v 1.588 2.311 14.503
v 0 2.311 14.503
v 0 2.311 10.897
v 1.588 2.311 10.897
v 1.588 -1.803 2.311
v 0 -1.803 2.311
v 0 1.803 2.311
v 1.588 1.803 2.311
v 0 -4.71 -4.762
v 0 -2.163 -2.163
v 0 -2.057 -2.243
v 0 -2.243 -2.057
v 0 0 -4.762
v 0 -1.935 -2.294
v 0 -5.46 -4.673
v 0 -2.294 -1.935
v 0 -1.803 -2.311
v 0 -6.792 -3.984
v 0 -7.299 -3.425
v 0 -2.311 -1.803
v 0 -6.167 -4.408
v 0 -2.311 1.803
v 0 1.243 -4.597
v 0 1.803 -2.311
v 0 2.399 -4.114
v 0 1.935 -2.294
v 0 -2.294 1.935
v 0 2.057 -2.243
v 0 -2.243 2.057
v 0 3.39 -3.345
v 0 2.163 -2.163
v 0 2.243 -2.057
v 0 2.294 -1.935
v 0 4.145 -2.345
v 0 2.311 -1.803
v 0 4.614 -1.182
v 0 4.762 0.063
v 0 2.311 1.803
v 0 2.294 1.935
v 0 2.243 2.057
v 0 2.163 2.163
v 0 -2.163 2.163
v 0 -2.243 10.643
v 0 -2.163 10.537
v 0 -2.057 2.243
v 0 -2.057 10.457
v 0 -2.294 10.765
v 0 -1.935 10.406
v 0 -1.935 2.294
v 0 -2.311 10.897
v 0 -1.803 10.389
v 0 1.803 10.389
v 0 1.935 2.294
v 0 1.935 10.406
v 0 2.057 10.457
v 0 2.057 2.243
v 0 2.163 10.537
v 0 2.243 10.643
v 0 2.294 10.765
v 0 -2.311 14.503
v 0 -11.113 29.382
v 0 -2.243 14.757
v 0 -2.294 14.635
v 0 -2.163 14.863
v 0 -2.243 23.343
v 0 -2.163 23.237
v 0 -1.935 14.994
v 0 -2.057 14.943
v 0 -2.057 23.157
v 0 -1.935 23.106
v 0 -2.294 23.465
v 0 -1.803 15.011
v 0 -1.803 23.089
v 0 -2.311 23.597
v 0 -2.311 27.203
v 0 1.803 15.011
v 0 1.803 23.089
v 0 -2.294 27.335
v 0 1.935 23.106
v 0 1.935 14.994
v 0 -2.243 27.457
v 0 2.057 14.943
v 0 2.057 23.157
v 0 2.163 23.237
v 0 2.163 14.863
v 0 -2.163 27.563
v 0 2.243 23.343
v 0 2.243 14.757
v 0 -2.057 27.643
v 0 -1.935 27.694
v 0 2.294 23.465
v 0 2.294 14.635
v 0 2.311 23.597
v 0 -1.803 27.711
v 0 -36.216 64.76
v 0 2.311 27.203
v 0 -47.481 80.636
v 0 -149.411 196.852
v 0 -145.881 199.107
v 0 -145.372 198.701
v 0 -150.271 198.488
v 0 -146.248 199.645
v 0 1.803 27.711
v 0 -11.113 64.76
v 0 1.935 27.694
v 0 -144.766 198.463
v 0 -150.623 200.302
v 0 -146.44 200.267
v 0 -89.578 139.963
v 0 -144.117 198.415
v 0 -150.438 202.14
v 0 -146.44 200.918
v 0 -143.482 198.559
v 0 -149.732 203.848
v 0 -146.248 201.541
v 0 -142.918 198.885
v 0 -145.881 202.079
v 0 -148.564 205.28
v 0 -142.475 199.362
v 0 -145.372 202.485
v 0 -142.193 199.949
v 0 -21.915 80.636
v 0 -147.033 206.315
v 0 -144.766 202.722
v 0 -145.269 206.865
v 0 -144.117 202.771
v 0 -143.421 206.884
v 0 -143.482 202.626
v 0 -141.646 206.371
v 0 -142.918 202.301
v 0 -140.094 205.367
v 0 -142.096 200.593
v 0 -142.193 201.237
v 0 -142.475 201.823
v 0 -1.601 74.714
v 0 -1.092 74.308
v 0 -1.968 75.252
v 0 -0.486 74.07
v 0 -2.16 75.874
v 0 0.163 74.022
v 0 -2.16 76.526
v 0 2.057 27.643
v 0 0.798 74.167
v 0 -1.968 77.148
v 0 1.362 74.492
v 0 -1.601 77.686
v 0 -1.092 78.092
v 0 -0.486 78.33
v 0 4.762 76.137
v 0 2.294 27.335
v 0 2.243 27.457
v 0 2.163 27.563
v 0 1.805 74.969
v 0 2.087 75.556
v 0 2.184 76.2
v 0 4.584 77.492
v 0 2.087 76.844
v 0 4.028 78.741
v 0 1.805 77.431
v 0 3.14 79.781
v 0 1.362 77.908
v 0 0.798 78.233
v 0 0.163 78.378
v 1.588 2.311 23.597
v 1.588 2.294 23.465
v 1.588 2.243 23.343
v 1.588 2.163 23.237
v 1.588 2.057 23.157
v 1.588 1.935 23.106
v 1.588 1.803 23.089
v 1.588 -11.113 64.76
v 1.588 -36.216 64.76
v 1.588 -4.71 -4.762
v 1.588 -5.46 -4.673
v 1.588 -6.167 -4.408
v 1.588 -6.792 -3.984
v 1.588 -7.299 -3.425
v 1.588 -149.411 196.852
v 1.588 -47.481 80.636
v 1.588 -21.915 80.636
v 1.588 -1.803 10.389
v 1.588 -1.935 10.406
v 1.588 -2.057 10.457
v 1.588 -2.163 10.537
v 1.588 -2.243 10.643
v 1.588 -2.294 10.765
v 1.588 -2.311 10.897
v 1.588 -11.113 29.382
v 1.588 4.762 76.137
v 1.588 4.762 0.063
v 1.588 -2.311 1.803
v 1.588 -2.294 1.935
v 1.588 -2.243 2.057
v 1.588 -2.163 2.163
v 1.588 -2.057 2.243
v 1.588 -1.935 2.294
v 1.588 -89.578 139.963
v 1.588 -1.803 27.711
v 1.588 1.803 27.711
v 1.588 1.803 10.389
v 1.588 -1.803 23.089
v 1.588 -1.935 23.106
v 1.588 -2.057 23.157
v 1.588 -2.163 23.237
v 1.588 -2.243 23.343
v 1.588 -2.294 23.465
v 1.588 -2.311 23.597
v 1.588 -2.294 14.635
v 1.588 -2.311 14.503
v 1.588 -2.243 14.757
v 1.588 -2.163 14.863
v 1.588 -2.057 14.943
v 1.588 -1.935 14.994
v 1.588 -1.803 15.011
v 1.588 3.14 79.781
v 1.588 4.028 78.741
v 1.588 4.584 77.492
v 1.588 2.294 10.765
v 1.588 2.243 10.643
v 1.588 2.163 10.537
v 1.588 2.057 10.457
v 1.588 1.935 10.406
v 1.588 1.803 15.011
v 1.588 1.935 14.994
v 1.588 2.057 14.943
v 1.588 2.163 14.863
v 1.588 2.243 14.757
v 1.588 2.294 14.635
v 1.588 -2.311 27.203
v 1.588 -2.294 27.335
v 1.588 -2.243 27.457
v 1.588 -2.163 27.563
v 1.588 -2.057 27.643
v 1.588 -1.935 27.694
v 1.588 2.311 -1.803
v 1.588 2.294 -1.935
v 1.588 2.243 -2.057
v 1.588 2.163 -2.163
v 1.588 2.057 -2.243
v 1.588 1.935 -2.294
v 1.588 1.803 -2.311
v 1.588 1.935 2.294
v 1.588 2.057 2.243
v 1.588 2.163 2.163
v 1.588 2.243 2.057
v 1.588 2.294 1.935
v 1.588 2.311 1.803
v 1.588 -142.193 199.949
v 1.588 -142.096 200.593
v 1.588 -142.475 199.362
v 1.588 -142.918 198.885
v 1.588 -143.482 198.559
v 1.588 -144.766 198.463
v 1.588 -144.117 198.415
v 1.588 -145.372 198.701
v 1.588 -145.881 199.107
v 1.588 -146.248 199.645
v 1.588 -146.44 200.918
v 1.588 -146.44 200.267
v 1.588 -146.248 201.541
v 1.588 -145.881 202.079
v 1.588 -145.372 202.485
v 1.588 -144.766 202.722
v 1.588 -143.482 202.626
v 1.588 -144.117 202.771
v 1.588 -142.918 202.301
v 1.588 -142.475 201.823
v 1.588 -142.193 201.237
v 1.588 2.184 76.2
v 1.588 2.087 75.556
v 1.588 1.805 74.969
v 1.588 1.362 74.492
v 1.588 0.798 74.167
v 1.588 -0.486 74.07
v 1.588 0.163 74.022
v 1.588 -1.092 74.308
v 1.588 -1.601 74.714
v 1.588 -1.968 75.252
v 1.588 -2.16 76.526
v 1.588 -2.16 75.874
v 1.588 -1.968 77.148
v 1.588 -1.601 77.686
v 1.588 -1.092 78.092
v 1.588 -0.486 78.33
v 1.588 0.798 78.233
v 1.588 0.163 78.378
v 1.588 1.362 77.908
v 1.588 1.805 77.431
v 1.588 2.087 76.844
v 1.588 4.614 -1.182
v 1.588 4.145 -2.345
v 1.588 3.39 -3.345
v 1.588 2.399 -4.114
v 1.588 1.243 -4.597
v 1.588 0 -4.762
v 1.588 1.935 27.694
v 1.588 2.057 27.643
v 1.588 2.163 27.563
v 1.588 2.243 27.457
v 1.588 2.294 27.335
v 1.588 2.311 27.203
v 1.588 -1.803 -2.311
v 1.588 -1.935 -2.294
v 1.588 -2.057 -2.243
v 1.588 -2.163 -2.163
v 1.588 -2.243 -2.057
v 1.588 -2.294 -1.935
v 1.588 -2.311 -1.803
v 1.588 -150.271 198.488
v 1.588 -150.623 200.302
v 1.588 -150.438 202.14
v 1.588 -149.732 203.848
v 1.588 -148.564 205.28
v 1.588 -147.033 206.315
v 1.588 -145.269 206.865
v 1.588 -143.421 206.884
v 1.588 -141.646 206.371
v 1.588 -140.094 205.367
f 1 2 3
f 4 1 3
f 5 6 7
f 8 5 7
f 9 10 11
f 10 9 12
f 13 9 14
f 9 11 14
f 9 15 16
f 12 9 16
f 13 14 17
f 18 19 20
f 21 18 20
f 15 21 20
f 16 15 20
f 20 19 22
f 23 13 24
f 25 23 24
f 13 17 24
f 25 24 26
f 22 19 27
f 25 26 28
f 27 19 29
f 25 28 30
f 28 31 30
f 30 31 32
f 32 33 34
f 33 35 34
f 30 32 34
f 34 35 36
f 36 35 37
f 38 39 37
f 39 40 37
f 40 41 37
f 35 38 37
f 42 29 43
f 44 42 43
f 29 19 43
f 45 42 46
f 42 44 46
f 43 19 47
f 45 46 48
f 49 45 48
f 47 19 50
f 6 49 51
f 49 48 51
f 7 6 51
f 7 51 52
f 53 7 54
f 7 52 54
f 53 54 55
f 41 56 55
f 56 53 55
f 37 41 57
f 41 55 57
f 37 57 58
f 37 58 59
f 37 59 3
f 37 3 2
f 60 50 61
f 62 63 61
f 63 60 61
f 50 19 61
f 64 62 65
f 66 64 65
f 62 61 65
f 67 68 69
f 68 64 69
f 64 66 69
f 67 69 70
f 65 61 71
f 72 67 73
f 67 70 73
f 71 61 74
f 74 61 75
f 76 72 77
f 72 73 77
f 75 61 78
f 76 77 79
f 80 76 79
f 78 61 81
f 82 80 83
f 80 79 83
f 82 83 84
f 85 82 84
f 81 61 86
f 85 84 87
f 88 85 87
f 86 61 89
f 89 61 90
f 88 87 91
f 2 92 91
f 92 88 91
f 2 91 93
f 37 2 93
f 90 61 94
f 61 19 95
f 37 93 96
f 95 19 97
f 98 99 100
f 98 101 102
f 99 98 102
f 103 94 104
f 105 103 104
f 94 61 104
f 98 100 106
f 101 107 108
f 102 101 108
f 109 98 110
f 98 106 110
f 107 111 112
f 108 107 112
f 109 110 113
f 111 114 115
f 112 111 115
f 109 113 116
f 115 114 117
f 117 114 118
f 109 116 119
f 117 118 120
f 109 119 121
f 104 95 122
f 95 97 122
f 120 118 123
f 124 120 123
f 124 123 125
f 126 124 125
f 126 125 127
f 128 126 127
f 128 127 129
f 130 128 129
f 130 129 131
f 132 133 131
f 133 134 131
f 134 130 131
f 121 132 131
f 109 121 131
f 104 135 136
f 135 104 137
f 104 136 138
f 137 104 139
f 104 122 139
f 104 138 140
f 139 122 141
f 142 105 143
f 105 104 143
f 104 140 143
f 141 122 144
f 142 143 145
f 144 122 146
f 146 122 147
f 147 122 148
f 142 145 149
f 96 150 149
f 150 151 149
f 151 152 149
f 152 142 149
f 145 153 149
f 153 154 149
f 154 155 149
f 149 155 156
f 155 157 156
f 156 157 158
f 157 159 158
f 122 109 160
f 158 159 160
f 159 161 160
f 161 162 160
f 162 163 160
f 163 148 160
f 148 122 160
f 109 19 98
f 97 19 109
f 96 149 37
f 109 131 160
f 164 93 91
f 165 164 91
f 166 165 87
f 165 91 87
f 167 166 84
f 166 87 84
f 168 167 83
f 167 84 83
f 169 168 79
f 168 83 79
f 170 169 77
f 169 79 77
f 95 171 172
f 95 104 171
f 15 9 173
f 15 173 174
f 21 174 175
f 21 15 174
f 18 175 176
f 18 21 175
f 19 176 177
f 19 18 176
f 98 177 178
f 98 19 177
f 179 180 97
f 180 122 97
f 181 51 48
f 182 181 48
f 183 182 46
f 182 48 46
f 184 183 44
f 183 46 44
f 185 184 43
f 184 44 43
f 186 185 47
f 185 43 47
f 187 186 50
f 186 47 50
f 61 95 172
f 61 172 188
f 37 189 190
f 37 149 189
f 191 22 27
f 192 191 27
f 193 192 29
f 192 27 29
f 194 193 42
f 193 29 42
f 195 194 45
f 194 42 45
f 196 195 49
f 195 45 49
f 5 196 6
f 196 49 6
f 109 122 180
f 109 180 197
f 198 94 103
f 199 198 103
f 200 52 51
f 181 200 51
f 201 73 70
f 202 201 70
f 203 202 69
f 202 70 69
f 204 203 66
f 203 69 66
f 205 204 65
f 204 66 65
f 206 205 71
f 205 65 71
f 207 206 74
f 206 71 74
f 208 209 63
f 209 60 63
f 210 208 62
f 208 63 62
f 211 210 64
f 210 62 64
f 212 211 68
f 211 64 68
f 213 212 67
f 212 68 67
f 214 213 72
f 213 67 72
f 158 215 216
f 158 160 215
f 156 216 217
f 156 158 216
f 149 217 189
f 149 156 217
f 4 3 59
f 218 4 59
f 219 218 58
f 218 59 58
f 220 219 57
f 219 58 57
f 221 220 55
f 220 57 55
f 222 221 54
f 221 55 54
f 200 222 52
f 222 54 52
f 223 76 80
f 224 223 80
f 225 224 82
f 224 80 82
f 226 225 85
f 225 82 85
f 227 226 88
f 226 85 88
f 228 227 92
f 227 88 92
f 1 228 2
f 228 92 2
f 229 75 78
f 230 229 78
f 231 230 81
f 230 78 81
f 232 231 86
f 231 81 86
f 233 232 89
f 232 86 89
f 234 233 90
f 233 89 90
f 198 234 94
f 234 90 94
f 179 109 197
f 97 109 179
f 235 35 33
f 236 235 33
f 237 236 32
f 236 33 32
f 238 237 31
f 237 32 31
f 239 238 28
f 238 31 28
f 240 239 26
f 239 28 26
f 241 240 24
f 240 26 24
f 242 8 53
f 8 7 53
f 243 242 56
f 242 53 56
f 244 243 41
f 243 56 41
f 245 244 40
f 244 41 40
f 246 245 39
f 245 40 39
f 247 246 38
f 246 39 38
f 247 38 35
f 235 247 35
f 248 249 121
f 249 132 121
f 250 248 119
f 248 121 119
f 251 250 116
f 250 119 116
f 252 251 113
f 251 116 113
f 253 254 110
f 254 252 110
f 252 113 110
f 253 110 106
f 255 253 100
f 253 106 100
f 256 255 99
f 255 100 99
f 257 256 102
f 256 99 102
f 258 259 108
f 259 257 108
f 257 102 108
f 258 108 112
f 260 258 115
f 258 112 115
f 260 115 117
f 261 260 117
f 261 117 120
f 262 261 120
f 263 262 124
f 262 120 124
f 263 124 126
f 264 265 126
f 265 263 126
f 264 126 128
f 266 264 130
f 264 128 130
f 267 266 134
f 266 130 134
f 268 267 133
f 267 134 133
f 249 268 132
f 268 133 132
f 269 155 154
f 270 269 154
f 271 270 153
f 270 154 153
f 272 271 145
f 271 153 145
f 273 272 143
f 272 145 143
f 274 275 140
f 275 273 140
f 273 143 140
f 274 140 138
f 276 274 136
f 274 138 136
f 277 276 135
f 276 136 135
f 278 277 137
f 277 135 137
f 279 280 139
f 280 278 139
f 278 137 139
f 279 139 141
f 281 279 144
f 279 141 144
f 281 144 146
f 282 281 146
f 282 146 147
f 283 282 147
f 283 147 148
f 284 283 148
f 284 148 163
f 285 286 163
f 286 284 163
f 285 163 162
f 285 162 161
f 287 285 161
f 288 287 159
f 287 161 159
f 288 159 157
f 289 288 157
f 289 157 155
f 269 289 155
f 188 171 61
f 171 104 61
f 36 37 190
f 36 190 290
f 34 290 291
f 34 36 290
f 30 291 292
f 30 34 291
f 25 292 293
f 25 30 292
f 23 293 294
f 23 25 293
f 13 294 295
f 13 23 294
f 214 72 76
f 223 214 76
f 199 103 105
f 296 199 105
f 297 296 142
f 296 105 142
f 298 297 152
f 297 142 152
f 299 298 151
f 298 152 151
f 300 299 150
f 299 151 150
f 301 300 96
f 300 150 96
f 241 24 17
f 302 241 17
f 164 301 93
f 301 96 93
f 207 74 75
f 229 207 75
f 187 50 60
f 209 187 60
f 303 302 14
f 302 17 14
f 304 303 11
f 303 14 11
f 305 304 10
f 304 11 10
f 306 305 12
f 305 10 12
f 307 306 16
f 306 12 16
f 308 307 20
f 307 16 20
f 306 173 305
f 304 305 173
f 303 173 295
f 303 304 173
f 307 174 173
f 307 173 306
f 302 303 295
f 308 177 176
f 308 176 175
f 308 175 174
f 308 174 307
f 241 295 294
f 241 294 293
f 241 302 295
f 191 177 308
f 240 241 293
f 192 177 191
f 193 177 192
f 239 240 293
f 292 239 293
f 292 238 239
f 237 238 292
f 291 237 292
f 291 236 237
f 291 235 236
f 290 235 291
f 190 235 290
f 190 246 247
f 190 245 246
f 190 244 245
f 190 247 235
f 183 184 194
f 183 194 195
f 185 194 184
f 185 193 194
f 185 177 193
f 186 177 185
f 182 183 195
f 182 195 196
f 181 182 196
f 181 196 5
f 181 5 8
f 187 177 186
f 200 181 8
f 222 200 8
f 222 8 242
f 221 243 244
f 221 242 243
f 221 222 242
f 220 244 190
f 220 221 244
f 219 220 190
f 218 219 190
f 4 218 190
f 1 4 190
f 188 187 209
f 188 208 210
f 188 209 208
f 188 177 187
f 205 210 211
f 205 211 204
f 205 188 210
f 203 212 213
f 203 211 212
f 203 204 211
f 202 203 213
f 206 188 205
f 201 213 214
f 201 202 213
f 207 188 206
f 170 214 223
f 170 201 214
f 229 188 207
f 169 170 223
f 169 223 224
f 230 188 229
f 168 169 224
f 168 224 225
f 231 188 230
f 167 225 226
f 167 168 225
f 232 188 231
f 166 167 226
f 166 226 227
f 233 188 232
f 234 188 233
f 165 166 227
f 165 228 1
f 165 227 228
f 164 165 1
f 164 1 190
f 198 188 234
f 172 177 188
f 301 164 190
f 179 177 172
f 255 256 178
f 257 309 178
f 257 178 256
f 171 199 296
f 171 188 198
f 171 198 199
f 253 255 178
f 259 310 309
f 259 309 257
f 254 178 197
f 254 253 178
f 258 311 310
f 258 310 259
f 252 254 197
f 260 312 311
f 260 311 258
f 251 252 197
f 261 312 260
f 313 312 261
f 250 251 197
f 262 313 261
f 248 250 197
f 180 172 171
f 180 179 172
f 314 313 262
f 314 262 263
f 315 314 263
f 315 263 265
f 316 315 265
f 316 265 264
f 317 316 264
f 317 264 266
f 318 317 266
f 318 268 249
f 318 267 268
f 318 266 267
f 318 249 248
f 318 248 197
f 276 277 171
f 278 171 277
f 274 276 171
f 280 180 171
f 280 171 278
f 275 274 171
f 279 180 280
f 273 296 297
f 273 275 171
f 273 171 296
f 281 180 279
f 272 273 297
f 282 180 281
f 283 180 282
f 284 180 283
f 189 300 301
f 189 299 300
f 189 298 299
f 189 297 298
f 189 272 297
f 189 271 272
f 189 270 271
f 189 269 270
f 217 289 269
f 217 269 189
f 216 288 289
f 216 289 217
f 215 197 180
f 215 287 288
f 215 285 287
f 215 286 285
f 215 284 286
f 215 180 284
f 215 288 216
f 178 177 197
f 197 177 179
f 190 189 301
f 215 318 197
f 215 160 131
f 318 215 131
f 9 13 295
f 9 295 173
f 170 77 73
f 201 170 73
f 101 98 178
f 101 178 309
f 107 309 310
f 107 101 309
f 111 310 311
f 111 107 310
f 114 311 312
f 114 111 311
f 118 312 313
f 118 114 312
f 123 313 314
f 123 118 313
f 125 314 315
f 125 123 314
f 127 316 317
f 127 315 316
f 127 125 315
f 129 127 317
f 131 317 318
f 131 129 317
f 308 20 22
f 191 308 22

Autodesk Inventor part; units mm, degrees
ref_plane "YZ Plane" through (0, 0, 0) normal (1, 0, 0) x (0, 1, 0)
ref_plane "XZ Plane" through (0, 0, 0) normal (0, 1, 0) x (-1, 0, 0)
ref_plane "XY Plane" through (0, 0, 0) normal (0, 0, 1) x (1, 0, 0)
sketch "main" plane through (0, 0, 0) normal (0, 0, 1) x (1, 0, 0)
  circle A0 centre (2982.9462, -106.4126) radius 2.1844
  circle A1 centre (2838.6663, 17.9802) radius 2.1844
  arc A2 (2982.9462, -187.3751) -> (2987.7082, -182.5494) centre (2982.9462, -182.6126) ccw
  arc A3 (2987.7082, -106.4758) -> (2986.0859, -102.8316) centre (2982.9462, -106.4126) ccw
  arc A4 (2842.8526, 22.7548) -> (2833.5352, 14.2393) centre (2838.6663, 17.9802) ccw
  line L0 (2987.7082, -106.4758) -> (2987.7082, -182.5494)
  line L1 (2986.0859, -102.8316) -> (2842.8526, 22.7548)
  line L2 (2981.1428, -180.3012) -> (2984.7496, -180.3012)
  line L3 (2985.2576, -180.8092) -> (2985.2576, -184.416)
  line L4 (2984.7496, -184.924) -> (2981.1428, -184.924)
  line L5 (2980.6348, -184.416) -> (2980.6348, -180.8092)
  line L6 (2980.6348, -180.3012) -> (2985.2576, -184.924) construction
  line L7 (2985.2576, -180.3012) -> (2980.6348, -184.924) construction
  line L8 (2981.1428, -167.6012) -> (2984.7496, -167.6012)
  line L9 (2985.2576, -168.1092) -> (2985.2576, -171.716)
  line L10 (2984.7496, -172.224) -> (2981.1428, -172.224)
  line L11 (2980.6348, -171.716) -> (2980.6348, -168.1092)
  line L12 (2980.6348, -167.6012) -> (2985.2576, -172.224) construction
  line L13 (2985.2576, -167.6012) -> (2980.6348, -172.224) construction
  line L14 (2981.1428, -154.9012) -> (2984.7496, -154.9012)
  line L15 (2985.2576, -155.4092) -> (2985.2576, -159.016)
  line L16 (2984.7496, -159.524) -> (2981.1428, -159.524)
  line L17 (2980.6348, -159.016) -> (2980.6348, -155.4092)
  line L18 (2980.6348, -154.9012) -> (2985.2576, -159.524) construction
  line L19 (2985.2576, -154.9012) -> (2980.6348, -159.524) construction
  arc A5 (2984.7496, -184.924) -> (2985.2576, -184.416) centre (2984.7496, -184.416) ccw
  arc A6 (2980.6348, -184.416) -> (2981.1428, -184.924) centre (2981.1428, -184.416) ccw
  arc A7 (2981.1428, -180.3012) -> (2980.6348, -180.8092) centre (2981.1428, -180.8092) ccw
  arc A8 (2985.2576, -180.8092) -> (2984.7496, -180.3012) centre (2984.7496, -180.8092) ccw
  arc A9 (2984.7496, -172.224) -> (2985.2576, -171.716) centre (2984.7496, -171.716) ccw
  arc A10 (2980.6348, -171.716) -> (2981.1428, -172.224) centre (2981.1428, -171.716) ccw
  arc A11 (2981.1428, -167.6012) -> (2980.6348, -168.1092) centre (2981.1428, -168.1092) ccw
  arc A12 (2985.2576, -168.1092) -> (2984.7496, -167.6012) centre (2984.7496, -168.1092) ccw
  arc A13 (2984.7496, -159.524) -> (2985.2576, -159.016) centre (2984.7496, -159.016) ccw
  arc A14 (2980.6348, -159.016) -> (2981.1428, -159.524) centre (2981.1428, -159.016) ccw
  arc A15 (2981.1428, -154.9012) -> (2980.6348, -155.4092) centre (2981.1428, -155.4092) ccw
  arc A16 (2985.2576, -155.4092) -> (2984.7496, -154.9012) centre (2984.7496, -155.4092) ccw
  line L20 (2982.9462, -187.3751) -> (2978.2364, -187.3751)
  line L21 (2975.647, -186.0374) -> (2833.5352, 14.2393)
  arc A17 (2975.647, -186.0374) -> (2978.2364, -187.3751) centre (2978.2364, -184.2001) ccw
  line L22 (2961.0316, -101.9771) -> (2893.3678, -42.6497)
  line L23 (2971.8332, -117.8521) -> (2971.8332, -153.2302)
  line L24 (2961.0316, -101.9771) -> (2935.4651, -101.9771)
  line L25 (2971.8332, -117.8521) -> (2946.7297, -117.8521)
  line L26 (2893.3678, -42.6497) -> (2935.4651, -101.9771)
  line L27 (2946.7297, -117.8521) -> (2971.8332, -153.2302)
  point P0 (2935.9211, -90.1281)
  point P1 (2982.9462, -169.9126)
  point P2 (2982.9462, -157.2126)
  point P3 (2976.5962, -187.3751)
  point P4 (2959.2815, -117.8521)
  dimension "d0" = 12.7
  dimension "d1" = 9.525
  dimension "d2" = 9.525
  dimension "d7" = 4.6228
  dimension "d8" = 4.6228
  dimension "d9" = 4.6228
  dimension "d10" = 4.6228
  dimension "d11" = 4.6228
  dimension "d12" = 4.6228
  dimension "d13" = 0.508
  dimension "d14" = 6.35
  dimension "d15" = 3.175
  dimension "d18" = 15.875
  dimension "d19" = 15.875
  dimension "d20" = 15.875
  dimension "d21" = 15.875
  dimension "d22" = 15.875
sketch "Sketch1" plane through (0, 0, 0) normal (1, 0, 0) x (0, 1, 0)
  circle A0 centre (0, 76.2) radius 2.1844
  circle A1 centre (-144.2799, 200.5928) radius 2.1844
  arc A2 (0, -4.7625) -> (4.7621, 0.0632) centre (0, 0) ccw
  arc A3 (4.7621, 76.1368) -> (3.1398, 79.781) centre (0, 76.2) ccw
  arc A4 (-140.0936, 205.3674) -> (-149.411, 196.8519) centre (-144.2799, 200.5928) ccw
  line L0 (4.7621, 76.1368) -> (4.7621, 0.0632)
  line L1 (3.1398, 79.781) -> (-140.0936, 205.3674)
  line L2 (-1.8034, 2.3114) -> (1.8034, 2.3114)
  line L3 (2.3114, 1.8034) -> (2.3114, -1.8034)
  line L4 (1.8034, -2.3114) -> (-1.8034, -2.3114)
  line L5 (-2.3114, -1.8034) -> (-2.3114, 1.8034)
  line L6 (-2.3114, 2.3114) -> (2.3114, -2.3114) construction
  line L7 (2.3114, 2.3114) -> (-2.3114, -2.3114) construction
  line L8 (-1.8034, 15.0114) -> (1.8034, 15.0114)
  line L9 (2.3114, 14.5034) -> (2.3114, 10.8966)
  line L10 (1.8034, 10.3886) -> (-1.8034, 10.3886)
  line L11 (-2.3114, 10.8966) -> (-2.3114, 14.5034)
  line L12 (-2.3114, 15.0114) -> (2.3114, 10.3886) construction
  line L13 (2.3114, 15.0114) -> (-2.3114, 10.3886) construction
  line L14 (-1.8034, 27.7114) -> (1.8034, 27.7114)
  line L15 (2.3114, 27.2034) -> (2.3114, 23.5966)
  line L16 (1.8034, 23.0886) -> (-1.8034, 23.0886)
  line L17 (-2.3114, 23.5966) -> (-2.3114, 27.2034)
  line L18 (-2.3114, 27.7114) -> (2.3114, 23.0886) construction
  line L19 (2.3114, 27.7114) -> (-2.3114, 23.0886) construction
  arc A5 (1.8034, -2.3114) -> (2.3114, -1.8034) centre (1.8034, -1.8034) ccw
  arc A6 (-2.3114, -1.8034) -> (-1.8034, -2.3114) centre (-1.8034, -1.8034) ccw
  arc A7 (-1.8034, 2.3114) -> (-2.3114, 1.8034) centre (-1.8034, 1.8034) ccw
  arc A8 (2.3114, 1.8034) -> (1.8034, 2.3114) centre (1.8034, 1.8034) ccw
  arc A9 (1.8034, 10.3886) -> (2.3114, 10.8966) centre (1.8034, 10.8966) ccw
  arc A10 (-2.3114, 10.8966) -> (-1.8034, 10.3886) centre (-1.8034, 10.8966) ccw
  arc A11 (-1.8034, 15.0114) -> (-2.3114, 14.5034) centre (-1.8034, 14.5034) ccw
  arc A12 (2.3114, 14.5034) -> (1.8034, 15.0114) centre (1.8034, 14.5034) ccw
  arc A13 (1.8034, 23.0886) -> (2.3114, 23.5966) centre (1.8034, 23.5966) ccw
  arc A14 (-2.3114, 23.5966) -> (-1.8034, 23.0886) centre (-1.8034, 23.5966) ccw
  arc A15 (-1.8034, 27.7114) -> (-2.3114, 27.2034) centre (-1.8034, 27.2034) ccw
  arc A16 (2.3114, 27.2034) -> (1.8034, 27.7114) centre (1.8034, 27.2034) ccw
  line L20 (0, -4.7625) -> (-4.7098, -4.7625)
  line L21 (-7.2992, -3.4248) -> (-149.411, 196.8519)
  arc A17 (-7.2992, -3.4248) -> (-4.7098, -4.7625) centre (-4.7098, -1.5875) ccw
  line L22 (-21.9146, 80.6355) -> (-89.5784, 139.9629)
  line L23 (-11.1129, 64.7605) -> (-11.1129, 29.3823)
  line L24 (-21.9146, 80.6355) -> (-47.481, 80.6355)
  line L25 (-11.1129, 64.7605) -> (-36.2165, 64.7605)
  line L26 (-89.5784, 139.9629) -> (-47.481, 80.6355)
  line L27 (-36.2165, 64.7605) -> (-11.1129, 29.3823)
extrude "Extrusion1" add sketch "Sketch1" along normal blind 1.5875
properties part number "Triiangle Gusset" material "Acetal Resin, White"
